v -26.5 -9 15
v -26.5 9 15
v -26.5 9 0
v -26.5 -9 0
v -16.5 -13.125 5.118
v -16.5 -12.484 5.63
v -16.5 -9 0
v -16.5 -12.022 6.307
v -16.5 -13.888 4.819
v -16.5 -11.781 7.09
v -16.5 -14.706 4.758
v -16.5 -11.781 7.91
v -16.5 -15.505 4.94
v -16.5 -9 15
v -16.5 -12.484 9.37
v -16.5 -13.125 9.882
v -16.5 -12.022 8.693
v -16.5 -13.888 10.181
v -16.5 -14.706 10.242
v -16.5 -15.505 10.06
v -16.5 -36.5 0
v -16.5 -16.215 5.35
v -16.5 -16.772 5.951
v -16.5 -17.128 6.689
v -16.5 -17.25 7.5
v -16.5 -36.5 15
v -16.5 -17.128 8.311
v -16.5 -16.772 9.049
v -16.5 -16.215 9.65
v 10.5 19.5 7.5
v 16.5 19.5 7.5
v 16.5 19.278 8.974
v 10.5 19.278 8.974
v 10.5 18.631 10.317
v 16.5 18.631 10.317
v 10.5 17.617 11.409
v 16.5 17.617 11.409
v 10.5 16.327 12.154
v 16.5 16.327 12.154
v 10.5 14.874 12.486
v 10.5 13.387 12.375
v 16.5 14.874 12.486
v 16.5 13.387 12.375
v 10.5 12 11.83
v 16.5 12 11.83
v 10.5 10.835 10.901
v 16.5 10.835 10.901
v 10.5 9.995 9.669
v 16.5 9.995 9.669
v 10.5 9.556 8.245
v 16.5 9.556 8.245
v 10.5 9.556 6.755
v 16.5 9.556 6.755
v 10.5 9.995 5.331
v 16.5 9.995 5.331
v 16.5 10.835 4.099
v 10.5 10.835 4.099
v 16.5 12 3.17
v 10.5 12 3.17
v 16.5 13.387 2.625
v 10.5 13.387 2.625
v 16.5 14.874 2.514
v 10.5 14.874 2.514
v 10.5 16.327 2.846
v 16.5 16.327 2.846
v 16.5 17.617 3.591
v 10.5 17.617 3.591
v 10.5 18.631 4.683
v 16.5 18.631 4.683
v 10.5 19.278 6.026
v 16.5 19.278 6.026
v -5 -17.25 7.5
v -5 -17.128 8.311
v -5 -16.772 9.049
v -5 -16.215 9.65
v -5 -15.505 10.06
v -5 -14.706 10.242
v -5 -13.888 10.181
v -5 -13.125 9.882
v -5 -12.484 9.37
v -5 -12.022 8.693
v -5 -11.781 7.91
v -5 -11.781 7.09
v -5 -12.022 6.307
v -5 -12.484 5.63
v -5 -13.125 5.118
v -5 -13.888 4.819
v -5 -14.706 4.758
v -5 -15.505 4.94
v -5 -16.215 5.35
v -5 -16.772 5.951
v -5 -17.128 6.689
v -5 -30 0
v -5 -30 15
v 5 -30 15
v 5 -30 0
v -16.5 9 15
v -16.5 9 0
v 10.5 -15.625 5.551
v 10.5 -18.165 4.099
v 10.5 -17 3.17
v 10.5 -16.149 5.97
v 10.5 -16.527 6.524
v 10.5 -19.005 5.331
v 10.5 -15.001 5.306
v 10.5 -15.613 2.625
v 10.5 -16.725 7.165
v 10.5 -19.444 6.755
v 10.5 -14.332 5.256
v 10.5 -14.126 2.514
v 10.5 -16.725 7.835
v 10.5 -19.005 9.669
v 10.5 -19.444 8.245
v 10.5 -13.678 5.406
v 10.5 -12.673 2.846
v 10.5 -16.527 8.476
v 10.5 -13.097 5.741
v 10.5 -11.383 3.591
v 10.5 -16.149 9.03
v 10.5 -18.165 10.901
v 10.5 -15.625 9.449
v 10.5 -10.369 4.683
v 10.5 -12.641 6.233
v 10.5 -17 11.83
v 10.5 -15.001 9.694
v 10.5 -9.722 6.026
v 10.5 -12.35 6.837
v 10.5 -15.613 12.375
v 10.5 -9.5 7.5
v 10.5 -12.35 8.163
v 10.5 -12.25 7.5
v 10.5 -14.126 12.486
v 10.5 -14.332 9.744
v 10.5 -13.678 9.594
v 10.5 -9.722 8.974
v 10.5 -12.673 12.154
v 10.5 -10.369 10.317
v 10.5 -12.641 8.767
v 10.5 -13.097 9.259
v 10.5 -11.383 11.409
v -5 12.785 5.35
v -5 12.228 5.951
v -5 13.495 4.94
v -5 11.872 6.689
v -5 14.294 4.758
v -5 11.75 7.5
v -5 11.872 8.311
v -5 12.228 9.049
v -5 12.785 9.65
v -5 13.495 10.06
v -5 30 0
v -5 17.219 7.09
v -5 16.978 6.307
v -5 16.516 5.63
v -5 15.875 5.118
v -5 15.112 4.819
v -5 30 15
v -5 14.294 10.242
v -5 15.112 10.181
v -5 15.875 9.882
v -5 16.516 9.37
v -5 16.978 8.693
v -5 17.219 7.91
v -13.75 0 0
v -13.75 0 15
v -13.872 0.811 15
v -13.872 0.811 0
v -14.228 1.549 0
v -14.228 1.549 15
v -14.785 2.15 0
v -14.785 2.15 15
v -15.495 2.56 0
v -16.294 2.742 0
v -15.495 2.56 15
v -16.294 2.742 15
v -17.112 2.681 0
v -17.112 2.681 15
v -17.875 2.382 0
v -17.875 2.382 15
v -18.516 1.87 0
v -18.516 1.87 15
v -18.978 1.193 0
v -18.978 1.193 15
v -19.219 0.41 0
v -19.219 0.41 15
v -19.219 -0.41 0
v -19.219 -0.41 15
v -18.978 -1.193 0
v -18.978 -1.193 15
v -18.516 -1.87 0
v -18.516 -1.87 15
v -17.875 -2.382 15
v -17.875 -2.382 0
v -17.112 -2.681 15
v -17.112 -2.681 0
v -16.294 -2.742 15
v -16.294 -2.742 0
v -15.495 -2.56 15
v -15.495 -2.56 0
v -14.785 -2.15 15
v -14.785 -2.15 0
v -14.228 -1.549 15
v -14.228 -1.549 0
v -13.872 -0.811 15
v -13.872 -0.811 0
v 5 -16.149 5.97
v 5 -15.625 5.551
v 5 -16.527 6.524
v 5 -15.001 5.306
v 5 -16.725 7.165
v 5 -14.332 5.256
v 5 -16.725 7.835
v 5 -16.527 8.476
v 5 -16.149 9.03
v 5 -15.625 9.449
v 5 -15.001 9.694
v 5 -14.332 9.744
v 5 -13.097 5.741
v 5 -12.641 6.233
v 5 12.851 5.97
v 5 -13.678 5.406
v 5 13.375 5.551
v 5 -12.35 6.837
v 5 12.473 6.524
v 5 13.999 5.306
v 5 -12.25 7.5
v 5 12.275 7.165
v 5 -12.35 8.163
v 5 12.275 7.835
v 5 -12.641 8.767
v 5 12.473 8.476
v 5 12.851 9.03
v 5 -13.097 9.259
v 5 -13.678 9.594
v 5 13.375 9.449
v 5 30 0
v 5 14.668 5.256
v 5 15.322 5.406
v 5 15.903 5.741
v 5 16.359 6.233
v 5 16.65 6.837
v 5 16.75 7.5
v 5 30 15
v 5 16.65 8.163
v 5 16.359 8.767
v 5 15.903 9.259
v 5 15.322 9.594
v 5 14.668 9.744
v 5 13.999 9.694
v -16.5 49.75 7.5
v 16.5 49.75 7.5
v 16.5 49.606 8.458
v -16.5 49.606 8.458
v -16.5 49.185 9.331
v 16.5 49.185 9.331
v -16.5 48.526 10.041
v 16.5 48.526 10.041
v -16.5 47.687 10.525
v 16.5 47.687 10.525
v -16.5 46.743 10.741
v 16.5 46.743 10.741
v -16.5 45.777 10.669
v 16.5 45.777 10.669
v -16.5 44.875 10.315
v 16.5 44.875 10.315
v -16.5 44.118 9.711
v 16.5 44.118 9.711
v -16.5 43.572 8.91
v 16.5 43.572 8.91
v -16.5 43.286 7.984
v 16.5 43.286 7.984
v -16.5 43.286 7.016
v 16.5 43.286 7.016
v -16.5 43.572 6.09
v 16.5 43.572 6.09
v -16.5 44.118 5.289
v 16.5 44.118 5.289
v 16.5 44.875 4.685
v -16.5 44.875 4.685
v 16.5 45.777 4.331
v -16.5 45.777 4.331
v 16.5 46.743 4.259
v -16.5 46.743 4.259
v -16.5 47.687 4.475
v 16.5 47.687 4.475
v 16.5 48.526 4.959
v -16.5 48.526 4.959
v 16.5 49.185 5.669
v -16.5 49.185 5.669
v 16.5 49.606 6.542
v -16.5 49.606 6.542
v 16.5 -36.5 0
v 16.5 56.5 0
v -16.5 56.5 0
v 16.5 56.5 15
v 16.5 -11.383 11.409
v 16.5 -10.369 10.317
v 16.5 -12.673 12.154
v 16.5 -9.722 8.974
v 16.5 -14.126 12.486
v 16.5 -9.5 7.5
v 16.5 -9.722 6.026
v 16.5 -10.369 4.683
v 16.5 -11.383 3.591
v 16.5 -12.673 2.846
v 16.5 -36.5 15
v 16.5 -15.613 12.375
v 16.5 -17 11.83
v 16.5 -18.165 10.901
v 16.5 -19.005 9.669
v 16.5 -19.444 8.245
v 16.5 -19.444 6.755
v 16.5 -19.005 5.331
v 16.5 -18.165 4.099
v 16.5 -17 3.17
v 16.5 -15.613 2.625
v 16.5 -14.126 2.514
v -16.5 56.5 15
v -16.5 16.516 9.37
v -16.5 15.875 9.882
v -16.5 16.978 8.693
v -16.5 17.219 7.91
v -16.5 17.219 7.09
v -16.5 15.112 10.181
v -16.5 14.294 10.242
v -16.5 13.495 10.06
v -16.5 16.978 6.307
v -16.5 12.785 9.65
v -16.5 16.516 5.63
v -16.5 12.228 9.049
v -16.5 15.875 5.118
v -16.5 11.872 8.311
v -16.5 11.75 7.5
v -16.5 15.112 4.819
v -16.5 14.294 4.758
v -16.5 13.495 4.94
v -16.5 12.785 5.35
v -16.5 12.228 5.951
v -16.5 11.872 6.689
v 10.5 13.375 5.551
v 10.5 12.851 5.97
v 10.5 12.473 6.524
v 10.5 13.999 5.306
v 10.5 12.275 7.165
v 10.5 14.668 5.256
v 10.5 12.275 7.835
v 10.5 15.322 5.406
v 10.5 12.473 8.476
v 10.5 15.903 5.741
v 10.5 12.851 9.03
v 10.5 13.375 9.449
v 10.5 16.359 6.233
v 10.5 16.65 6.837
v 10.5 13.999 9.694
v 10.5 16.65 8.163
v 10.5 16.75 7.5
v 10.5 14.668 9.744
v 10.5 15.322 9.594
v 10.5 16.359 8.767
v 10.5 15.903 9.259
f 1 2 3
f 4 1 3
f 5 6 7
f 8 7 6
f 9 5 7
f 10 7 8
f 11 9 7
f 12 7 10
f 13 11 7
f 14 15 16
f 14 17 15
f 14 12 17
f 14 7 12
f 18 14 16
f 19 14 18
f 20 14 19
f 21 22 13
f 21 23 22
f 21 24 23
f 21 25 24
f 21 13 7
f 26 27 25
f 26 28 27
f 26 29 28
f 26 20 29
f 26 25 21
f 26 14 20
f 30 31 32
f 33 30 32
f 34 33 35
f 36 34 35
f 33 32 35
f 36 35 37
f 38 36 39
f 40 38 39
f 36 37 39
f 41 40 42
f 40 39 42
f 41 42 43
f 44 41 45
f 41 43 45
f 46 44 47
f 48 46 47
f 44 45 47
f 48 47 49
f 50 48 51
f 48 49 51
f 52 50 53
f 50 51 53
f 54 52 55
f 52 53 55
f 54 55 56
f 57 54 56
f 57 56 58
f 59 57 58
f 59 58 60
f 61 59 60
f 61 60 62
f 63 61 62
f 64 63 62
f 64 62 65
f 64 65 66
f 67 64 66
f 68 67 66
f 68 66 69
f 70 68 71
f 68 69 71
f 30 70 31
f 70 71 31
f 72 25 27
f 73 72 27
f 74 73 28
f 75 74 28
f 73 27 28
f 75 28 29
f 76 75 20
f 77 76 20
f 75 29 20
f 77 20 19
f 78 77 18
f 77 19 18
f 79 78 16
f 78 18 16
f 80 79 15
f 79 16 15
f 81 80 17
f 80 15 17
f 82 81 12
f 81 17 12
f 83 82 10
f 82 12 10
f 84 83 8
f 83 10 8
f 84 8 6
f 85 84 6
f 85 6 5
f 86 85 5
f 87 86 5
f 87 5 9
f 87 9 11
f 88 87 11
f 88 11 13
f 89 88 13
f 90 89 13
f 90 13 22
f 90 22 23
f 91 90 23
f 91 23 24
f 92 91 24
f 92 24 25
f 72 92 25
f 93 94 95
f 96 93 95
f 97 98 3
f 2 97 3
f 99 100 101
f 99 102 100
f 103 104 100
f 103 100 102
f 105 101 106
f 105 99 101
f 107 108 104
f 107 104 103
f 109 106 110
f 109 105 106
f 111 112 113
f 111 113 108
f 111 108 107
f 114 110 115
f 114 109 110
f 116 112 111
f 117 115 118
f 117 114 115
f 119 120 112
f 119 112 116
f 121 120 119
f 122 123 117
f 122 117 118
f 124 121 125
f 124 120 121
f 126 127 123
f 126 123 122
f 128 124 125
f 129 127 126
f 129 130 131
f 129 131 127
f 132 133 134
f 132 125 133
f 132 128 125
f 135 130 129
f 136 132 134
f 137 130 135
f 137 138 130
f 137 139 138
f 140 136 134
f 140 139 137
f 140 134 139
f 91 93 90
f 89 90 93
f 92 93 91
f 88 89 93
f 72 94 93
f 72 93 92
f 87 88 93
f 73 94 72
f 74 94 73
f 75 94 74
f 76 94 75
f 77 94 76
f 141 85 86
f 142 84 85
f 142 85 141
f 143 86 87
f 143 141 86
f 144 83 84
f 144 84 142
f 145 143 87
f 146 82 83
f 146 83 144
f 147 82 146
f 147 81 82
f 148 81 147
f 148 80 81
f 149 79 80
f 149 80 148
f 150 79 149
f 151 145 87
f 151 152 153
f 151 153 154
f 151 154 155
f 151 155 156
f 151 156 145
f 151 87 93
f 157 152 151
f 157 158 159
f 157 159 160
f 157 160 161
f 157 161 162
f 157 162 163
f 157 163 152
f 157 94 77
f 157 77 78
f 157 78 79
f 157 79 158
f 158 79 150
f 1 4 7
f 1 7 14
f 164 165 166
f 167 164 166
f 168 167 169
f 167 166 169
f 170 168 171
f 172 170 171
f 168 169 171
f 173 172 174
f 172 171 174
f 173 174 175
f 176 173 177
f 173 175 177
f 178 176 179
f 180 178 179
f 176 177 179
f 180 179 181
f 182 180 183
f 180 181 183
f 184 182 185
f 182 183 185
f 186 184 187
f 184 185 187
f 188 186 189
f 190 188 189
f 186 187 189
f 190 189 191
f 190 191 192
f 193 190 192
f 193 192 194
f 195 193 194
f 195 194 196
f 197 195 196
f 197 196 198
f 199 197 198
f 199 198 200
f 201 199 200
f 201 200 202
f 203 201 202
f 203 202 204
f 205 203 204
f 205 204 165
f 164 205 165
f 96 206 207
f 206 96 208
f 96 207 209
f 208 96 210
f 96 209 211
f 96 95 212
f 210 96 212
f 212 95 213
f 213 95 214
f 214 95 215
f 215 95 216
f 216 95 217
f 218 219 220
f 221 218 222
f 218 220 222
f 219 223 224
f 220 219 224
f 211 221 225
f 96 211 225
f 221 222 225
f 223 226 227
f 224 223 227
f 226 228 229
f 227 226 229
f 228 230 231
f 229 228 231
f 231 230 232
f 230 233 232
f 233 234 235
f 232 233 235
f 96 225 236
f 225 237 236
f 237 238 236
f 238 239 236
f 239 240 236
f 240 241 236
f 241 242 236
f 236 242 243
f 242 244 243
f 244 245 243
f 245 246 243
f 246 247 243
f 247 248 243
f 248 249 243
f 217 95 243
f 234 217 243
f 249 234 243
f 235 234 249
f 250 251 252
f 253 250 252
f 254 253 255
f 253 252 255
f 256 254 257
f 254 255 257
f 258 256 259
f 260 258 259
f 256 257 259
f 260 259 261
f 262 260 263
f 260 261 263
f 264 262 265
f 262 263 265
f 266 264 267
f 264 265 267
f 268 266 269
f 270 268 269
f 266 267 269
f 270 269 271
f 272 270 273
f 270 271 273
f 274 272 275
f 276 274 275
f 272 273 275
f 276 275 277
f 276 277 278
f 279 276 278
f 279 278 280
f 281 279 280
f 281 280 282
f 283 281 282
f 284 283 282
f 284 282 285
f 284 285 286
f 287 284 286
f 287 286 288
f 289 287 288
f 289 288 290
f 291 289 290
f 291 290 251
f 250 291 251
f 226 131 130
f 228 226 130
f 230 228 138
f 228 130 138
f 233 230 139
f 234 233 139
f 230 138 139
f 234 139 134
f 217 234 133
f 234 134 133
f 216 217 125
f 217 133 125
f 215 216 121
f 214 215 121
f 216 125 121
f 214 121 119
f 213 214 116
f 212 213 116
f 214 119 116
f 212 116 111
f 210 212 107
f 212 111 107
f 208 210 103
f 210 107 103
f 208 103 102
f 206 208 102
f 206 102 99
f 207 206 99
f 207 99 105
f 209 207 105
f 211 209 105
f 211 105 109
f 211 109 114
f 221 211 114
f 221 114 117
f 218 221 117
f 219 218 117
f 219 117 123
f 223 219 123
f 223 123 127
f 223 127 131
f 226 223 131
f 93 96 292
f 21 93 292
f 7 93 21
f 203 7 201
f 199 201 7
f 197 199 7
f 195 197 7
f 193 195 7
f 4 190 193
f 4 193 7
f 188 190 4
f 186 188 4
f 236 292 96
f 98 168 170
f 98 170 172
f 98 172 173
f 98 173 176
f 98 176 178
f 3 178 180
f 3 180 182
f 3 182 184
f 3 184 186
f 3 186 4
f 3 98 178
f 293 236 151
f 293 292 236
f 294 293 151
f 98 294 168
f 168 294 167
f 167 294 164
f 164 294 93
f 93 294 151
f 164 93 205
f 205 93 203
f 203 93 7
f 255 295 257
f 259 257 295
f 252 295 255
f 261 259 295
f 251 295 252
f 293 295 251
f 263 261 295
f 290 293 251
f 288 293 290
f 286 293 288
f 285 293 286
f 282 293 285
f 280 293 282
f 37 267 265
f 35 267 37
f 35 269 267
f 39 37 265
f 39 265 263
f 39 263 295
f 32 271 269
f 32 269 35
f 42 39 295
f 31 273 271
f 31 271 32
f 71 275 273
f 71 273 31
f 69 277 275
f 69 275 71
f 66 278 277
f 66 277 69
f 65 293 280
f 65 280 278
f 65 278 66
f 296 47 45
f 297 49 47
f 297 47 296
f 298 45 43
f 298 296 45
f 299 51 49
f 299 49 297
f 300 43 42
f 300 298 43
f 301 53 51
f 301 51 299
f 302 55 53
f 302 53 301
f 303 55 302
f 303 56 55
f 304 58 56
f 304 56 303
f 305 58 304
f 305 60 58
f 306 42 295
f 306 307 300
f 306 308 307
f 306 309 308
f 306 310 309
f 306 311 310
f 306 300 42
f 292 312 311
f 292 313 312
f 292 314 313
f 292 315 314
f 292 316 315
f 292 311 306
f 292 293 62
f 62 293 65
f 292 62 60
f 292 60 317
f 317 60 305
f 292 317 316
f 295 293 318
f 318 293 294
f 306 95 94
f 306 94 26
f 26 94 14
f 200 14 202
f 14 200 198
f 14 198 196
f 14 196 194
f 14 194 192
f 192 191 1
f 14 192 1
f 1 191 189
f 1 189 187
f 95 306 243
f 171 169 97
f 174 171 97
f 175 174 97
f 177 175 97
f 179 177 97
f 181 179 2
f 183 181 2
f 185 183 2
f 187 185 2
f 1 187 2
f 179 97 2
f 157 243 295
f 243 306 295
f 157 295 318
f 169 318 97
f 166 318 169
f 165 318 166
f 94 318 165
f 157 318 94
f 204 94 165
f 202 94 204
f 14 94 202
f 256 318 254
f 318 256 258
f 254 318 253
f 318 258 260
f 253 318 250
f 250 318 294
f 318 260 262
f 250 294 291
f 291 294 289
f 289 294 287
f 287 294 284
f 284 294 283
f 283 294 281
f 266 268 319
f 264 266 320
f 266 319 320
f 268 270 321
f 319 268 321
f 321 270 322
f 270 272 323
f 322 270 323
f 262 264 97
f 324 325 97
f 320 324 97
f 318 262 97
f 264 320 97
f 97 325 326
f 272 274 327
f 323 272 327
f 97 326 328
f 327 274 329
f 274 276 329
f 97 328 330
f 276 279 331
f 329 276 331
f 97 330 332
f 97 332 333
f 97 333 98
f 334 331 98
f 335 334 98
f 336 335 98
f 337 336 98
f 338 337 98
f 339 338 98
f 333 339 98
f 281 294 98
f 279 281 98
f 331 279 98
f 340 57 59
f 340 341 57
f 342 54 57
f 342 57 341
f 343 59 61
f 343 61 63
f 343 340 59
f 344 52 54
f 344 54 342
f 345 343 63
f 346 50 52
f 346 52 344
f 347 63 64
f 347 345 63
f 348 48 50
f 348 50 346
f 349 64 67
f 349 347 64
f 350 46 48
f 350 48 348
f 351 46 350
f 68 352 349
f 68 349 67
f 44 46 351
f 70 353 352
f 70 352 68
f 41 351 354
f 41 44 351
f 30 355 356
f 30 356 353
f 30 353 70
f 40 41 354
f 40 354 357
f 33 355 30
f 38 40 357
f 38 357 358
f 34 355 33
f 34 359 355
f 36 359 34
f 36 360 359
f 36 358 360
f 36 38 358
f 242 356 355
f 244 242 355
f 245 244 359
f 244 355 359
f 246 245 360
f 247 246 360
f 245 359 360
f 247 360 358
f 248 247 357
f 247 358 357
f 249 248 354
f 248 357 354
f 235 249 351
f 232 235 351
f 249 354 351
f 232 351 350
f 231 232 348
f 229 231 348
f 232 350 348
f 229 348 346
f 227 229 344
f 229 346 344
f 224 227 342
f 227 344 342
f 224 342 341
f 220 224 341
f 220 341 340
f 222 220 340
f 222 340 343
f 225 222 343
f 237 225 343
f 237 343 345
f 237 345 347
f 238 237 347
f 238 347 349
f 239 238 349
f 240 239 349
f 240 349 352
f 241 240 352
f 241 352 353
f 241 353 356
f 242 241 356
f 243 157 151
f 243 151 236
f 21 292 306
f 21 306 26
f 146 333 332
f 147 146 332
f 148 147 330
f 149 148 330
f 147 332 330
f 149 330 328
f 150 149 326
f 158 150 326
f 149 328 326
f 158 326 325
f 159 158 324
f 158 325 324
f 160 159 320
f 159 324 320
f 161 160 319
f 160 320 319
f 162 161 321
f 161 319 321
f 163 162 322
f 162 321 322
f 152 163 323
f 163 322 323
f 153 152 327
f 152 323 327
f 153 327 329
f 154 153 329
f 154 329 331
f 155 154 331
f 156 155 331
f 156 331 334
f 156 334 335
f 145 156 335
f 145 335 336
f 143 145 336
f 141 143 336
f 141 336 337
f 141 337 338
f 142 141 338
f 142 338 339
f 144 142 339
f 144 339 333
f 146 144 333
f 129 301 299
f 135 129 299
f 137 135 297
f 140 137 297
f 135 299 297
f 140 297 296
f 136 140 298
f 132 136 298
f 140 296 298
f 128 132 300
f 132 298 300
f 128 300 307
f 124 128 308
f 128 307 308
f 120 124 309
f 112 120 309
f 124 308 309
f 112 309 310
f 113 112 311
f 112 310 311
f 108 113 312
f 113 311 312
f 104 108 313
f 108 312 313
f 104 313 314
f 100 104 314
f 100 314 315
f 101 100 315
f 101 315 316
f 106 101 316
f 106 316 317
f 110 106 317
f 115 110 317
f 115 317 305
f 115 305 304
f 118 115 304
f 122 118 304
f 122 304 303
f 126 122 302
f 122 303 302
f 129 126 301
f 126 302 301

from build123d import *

# Parameters (mm, degrees)
PAD_DEPTH          = 15
SKETCH001_R        = 3.25
POCKET_DEPTH       = 40
SKETCH002_R        = 2.75
POCKET001_DEPTH    = 20
POCKET001_FACE10_W = 53
POCKET001_FACE10_H = 15
PAD001_DEPTH       = 10
SKETCH003_W        = 10
SKETCH003_H        = 60
POCKET002_DEPTH    = 20
POCKET002_FACE11_W = 45.5
POCKET002_FACE11_H = 15
POCKET003_DEPTH    = 10
SKETCH004_R        = 2.25
POCKET004_DEPTH    = 100
SKETCH005_R        = 2.75
POCKET005_DEPTH    = 15
SKETCH006_W        = 27.5
SKETCH006_H        = 15
POCKET006_DEPTH    = 10
SKETCH007_R        = 2.75
POCKET007_DEPTH    = 15
SKETCH009_R        = 5
POCKET008_DEPTH    = 6


with BuildPart() as part:
    # Sketch → Pad (new body)
    with BuildSketch(Plane.XY):
        Polygon((-16.5, 56.5), (-16.5, 9), (-26.5, 9), (-26.5, -26.5), (26.5, -26.5), (26.5, 9), (16.5, 9), (16.5, 56.5), align=None)
    extrude(amount=PAD_DEPTH)

    # Sketch001 (on Face7 of Pad) → Pocket (cut)
    with BuildSketch(Plane.YZ.offset(16.5)):
        with Locations((46.5, 7.5)):
            Circle(SKETCH001_R)
    extrude(amount=-POCKET_DEPTH, mode=Mode.SUBTRACT)

    # Sketch002 (on Face4 of Pocket) → Pocket001 (cut)
    with BuildSketch(Plane.XY.offset(15)):
        with Locations((-16.5, 0)):
            Circle(SKETCH002_R)
    extrude(amount=-POCKET001_DEPTH, mode=Mode.SUBTRACT)

    # Pocket001 Face10 → Pad001 (add)
    with BuildSketch(Plane(origin=(0, -26.5, 7.5), x_dir=(-1, 0, 0), z_dir=(0, -1, 0))):
        Rectangle(POCKET001_FACE10_W, POCKET001_FACE10_H)
    extrude(amount=PAD001_DEPTH)

    # Sketch003 (on Face10 of Pad001) → Pocket002 (cut)
    with BuildSketch(Plane.XY.offset(15)):
        Rectangle(SKETCH003_W, SKETCH003_H)
    extrude(amount=-POCKET002_DEPTH, mode=Mode.SUBTRACT)

    # Pocket002 Face11 → Pocket003 (cut)
    with BuildSketch(Plane(origin=(26.5, -13.75, 7.5), x_dir=(0, -1, 0), z_dir=(1, 0, 0))):
        Rectangle(POCKET002_FACE11_W, POCKET002_FACE11_H)
    extrude(amount=-POCKET003_DEPTH, mode=Mode.SUBTRACT)

    # Sketch004 (on Face14 of Pocket003) → Pocket004 (cut)
    with BuildSketch(Plane.YZ.offset(16.5)):
        with Locations((-14.5, 7.5)):
            Circle(SKETCH004_R)
        with Locations((14.5, 7.5)):
            Circle(SKETCH004_R)
    extrude(amount=-POCKET004_DEPTH, mode=Mode.SUBTRACT)

    # Sketch005 (on Face1 of Pocket004) → Pocket005 (cut)
    with BuildSketch(Plane(origin=(-16.5, 0, 0), x_dir=(0, -1, 0), z_dir=(-1, 0, 0))):
        with Locations((-14.5, 7.5)):
            Circle(SKETCH005_R)
    extrude(amount=-POCKET005_DEPTH, mode=Mode.SUBTRACT)

    # Sketch006 (on Face9 of Pocket005) → Pocket006 (cut)
    with BuildSketch(Plane(origin=(-26.5, 0, 0), x_dir=(0, -1, 0), z_dir=(-1, 0, 0))):
        with Locations((22.75, 7.5)):
            Rectangle(SKETCH006_W, SKETCH006_H)
    extrude(amount=-POCKET006_DEPTH, mode=Mode.SUBTRACT)

    # Sketch007 (on Face11 of Pocket006) → Pocket007 (cut)
    with BuildSketch(Plane(origin=(-16.5, 0, 0), x_dir=(0, -1, 0), z_dir=(-1, 0, 0))):
        with Locations((14.5, 7.5)):
            Circle(SKETCH007_R)
    extrude(amount=-POCKET007_DEPTH, mode=Mode.SUBTRACT)

    # Sketch009 (on Face8 of Pocket007) → Pocket008 (cut)
    with BuildSketch(Plane.YZ.offset(16.5)):
        with Locations((-14.5, 7.5)):
            Circle(SKETCH009_R)
        with Locations((14.5, 7.5)):
            Circle(SKETCH009_R)
    extrude(amount=-POCKET008_DEPTH, mode=Mode.SUBTRACT)


solid = part.part
